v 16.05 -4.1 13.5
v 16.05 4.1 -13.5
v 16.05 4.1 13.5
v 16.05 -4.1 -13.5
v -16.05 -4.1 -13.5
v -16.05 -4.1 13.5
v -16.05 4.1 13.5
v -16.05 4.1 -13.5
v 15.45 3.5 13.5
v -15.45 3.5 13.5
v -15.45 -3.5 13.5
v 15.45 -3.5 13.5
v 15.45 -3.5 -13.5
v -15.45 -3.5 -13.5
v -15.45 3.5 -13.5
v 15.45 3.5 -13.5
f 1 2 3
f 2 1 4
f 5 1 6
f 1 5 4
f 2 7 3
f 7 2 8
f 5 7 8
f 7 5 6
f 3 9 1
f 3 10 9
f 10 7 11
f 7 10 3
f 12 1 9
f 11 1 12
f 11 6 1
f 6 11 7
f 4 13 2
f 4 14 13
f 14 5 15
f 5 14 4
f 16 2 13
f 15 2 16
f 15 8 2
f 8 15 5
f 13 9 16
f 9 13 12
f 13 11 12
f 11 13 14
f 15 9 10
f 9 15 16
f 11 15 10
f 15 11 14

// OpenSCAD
// file: basico.scad
////////////////////////////////////////////////////////////////////////////////////////////////////////////////////////
//
// utilidades y variables básicas que suelo usar
// It is licensed under the Creative Commons - GNU LGPL 2.1 license.
// © 2014-2017 by luiso gutierrez (sacamantecas)
//
// cada módulo tiene su ejemplo simple correspondiente
// se recomienda ver qué parámetros tiene y experimentar con ellos
//


// corte_a_capa(n, [por_exceso]) ajusta una altura a nº entero de capas (se espera que el llamador haya asignado valor a $alto_de_capa)
function corte_a_capa(cuanto, exceso=false) = floor((cuanto+(exceso?($alto_de_capa-.0001):0))/$alto_de_capa)*$alto_de_capa;
// correccion() sirve para remarcar el código donde se hace una corrección sobre un valor teórico para que la pieza salga perfecta en la práctica
function correccion( valor )=valor; 
// numero de facetas segun el diametro, ajustado a multiplo de 4 para casar figuras ortogonales
function fn(d) = floor(( d/$fs*3.1416+3)/4)*4 ; 



////////////////////////////////////////////////////////////////////////////////////////////////////////////////////////////////////////////////////////


mp = .1 ; // muy poco


// Para ayudar a la depuración dibujando un aspa (mejor resaltada con #) en el punto actual o con una traslación a partir del mismo
// ejemplo: marcar el punto y la orientación dentro de una transformación compleja:
//		translate([20, 0, 0]) rotate([0, 0, 60]) translate([0,30,0]) rotate([0,45,0]) translate([0,0,40]) aspa();
// es pueden dibujar planos en vez de ejes, por ejemplo el plano perpendicular a Y con el eje Y (los ejes X y Z no se pintan porque quedan incluidos en el plano): 
//		aspa([0,1,0]);
module aspa(normales=[0,0,0]) {
	mucho=200 ;
	if (normales[0]) cube([mp,mucho,mucho], center=true);
	if (normales[1]) cube([mucho,mp,mucho], center=true);
	if (normales[2]) cube([mucho,mucho,mp], center=true);
	if (!(normales[1]+normales[2])) cube([mucho,mp,mp], center=true);
	if (!(normales[0]+normales[2])) cube([mp,mucho,mp], center=true);
	if (!(normales[0]+normales[1])) cube([mp,mp,mucho], center=true);
}


////////////////////////////////////////////////////////////////////////////////////////////////////////////////////////////////////////////////////////
// afeitar una pieza: es un corte adelantado en la base, para ahorrarnos el afeitado posterior de la pieza
// dificilmente una transformación puede ser más lenta :(
// ejemplo:
//		afeita() cube([30, 20, 10]);
module afeita(cuanto=.25) {
	maximo=200 ;
	
	difference() {
		children();
		if (cuanto)
			minkowski() {
				difference() {
					translate([-maximo/2,-maximo/2,-mp])
						cube([maximo,maximo,$alto_de_capa+mp]);
					render()
						children();
				}
				translate([0,0,-mp])
					cylinder(r=cuanto, h=mp, $fn=4);
			}
	}
}

////////////////////////////////////////////////////////////////////////////////////////////////////////////////////////////////////////////////////////
// agujero para meter una rosca de embutir dándole un calentón con el soldador
// el soporte por defecto no se pone, y si se pone es para agujero horizontal por defecto
// ejemplo:	$fa=1;$fs=1;$alto_de_capa=.3; difference() { %cube([30, 20, 20]); translate([15, 0, 10]) rotate([-90,0,0]) rosca_embutir(soportada=1); translate([15, 10,20]) rotate([180,0,0]) rosca_embutir(8) ; translate([15, 0, 0]) rosca_embutir(soportada=1, soporte_axial=1); }
module rosca_embutir(profundidad=5, soportada=0, soporte_axial=0) {
	H = 4 ;	
	Dg = [5.6, 5.2];
	Dp = 3.4;
	ancho_churrito = .5;
	$fn=12;

	if ($alto_de_capa == undef) echo("$alto_de_capa SIN DEFINIR, ESTO NO PUEDE SALIR BIEN")	;
	
	difference() {
		union() {
			translate([0,0,(H-mp)/2]) cylinder(d1=Dg[0], d2=Dg[1], h=H+mp, center=true);
			translate([0,0,profundidad/2]) cylinder(d=Dp, h=profundidad, center=true);
		}
		if (soportada) {
			if (soporte_axial)
				translate([0, 0, -mp])				
					difference() {
						cylinder(d=Dp + 2 * ancho_churrito, h=H - $alto_de_capa + mp);
						translate([0, 0, -mp])
							cylinder(d = Dp, h=H - $alto_de_capa + 3*mp);
					}
			else {
				escala = (Dg[0] - 2 * $alto_de_capa) / Dg[0] ;
				angulo_voladizo = 50 ; // para estos tamaños se puede usar hasta 60º 
				translate([0,0,-1.5]) // un hueco horizontal de 1.5 está bien
					intersection() {
						scale([escala, escala, 1])
							rosca_embutir(profundidad=0, soportada=0);
						translate([0,0,profundidad/2])
							cube([Dg[0] * cos(angulo_voladizo), 6, profundidad], center=true);
					}
			}
		}
	}
}
// main file
//////////////////////////////////////////////////////////////////////////////////////////////////////////////
//
// frontal para la fuente de alimentación innobo i650
// It is licensed under the Creative Commons - GNU LGPL 2.1 license.
// © 2018 by luis gutierrez (sacamantecas)
//
//

use <basico.scad>

$fa = 5 ;
$fs = 1 ;
// constantes de uso interno;
X = 0 ;
Y = 1 ;
Z = 2 ;
mp = .1 ;
fabricar = true ;



bloque = [150, 27, 85];
fila_z = [20, 60];
columna_x = [20, 45, 70, 95];
interruptor_x = bloque[X] - columna_x[0];
interruptor_pasante_d = 6.8 ;
interruptor_pasante_e = 6 ;
interruptor_bloque = [12.2, bloque[Y],14];


bloque_USB = [32.1, bloque[Y], 8.2 ];
USB_x = interruptor_x + interruptor_pasante_d/2 - bloque_USB[X]/2;

LED1_x = interruptor_x ;
LED2_x = USB_x - (LED1_x - USB_x);
LED1_z = (fila_z[0]+fila_z[1])/2 - 3 ;
LED2_z = LED1_z;
LED_pasante_d = 8.4 ;
LED_pasante_e = 9 ;
LED_holgante_d = 18 ;


conector_pasante = 8.2 ;
conector_holgante = correccion(14 + .3) ;
conector_pasante_e = 3.5 ;

esparrago_d = correccion( 4 + .8 ) ;
esparrago_largo = bloque[Y] - 5 ;
esparrago_margen_x = 9 ;
esparrago_margen_z = esparrago_margen_x;

salida_cables_prot_dy = 3 ;
salida_cables_prot_d = 30 ;
salida_cables_d = 22 ;
salida_cables_dy = bloque[Y] - LED_pasante_e ;
salida_cables_x = bloque[X] - 14 ;
salida_cables_z = bloque[Z] / 2 ;

rebaje_trasero = bloque[Y] - 10 ;


// apaño para quitar holgura al bloque USB y facilitar el pegado
!rotate([90,0,0])
	difference() {
		cube(bloque_USB, center=true);		
		cube(bloque_USB - [1.2,-1,1.2], center=true);
	}


// patitas
for (x = [40, 60, 80, 100])
	translate([x, -30, 0])
		 difference() {
			diametro = 15 ;
			altura = 10 ;
			corte_desde_tornillo = 5 ; 
			cylinder(d=diametro, h=altura);
			cylinder(d=3.6, h=altura); // vastago tornillo
			translate([0,0,7])
				cylinder(d=6, h=altura); // cabeza tornillo
			translate([diametro/2 + corte_desde_tornillo, 0, altura/2])	
				cube([diametro, diametro, altura], center = true);
		}


// plantilla para hacer los agujeros a la fuente
rotate([(fabricar ? 90 : 0),0,0])
	 difference() {
		cube(bloque - [0, bloque[Y] - 1, 0]);
		translate([esparrago_margen_x+5, 0, esparrago_margen_z+5])
			cube(bloque - [(esparrago_margen_x+5)*2, bloque[Y] - 1, (esparrago_margen_z+5)*2]);
		for (lado = [-1, 1])
			for (altura = [-1, 1])
				translate([bloque[X]/2 + lado * (bloque[X]/2 - esparrago_margen_x), 0, bloque[Z]/2 + altura * (bloque[Z]/2 - esparrago_margen_z)])
					rotate([-90,0,0])
						cylinder(d=2, h=10);
	}


// frontal de la fuente
!
rotate([(fabricar ? 90 : 0),0,0])
	difference() {
		cube(bloque);
		// agujeros conectores arriba
		for (i=columna_x)
			translate([i, -mp, fila_z[1]]) {
				rotate([-90, 0, 0]) 
					cylinder(d=conector_pasante, h=bloque[Y]);
				translate([0, conector_pasante_e, 0])
					rotate([-90, 0, 0]) 
						cylinder(d=conector_holgante, h=bloque[Y]);
			}
		// interruptor
		translate([interruptor_x, 0, fila_z[1]]) {
			translate([0,interruptor_pasante_e + interruptor_bloque[Y]/2 ,0])
				cube(interruptor_bloque, center=true);
			translate([0,-mp,0])
				rotate([-90,0,0])
					cylinder(d=interruptor_pasante_d, h=bloque[Y]);
		}

		// fila de abajo
		for (i=[columna_x[0], columna_x[1], columna_x[2]] )
			translate([i, -mp, fila_z[0]]) {
				rotate([-90, 0, 0]) 
					cylinder(d=conector_pasante, h=bloque[Y]);
				translate([0, conector_pasante_e, 0])
					rotate([-90, 0, 0]) 
						cylinder(d=conector_holgante, h=bloque[Y]);
			}
		// conector USB
		translate([USB_x,-mp,fila_z[0]])
			bloque_USB();
		
		// LEDS
		translate([LED1_x, 0, LED1_z])
			LED();
		translate([LED2_x, 0, LED2_z])
			LED();

		// esparragos
		for (lado = [-1, 1])
			for (altura = [-1, 1])
				translate([bloque[X]/2 + lado * (bloque[X]/2 - esparrago_margen_x), 0, bloque[Z]/2 + altura * (bloque[Z]/2 - esparrago_margen_z)])
					esparrago();

		// rebajes
		difference() {
			translate([16, bloque[Y] - rebaje_trasero + mp, -mp])
				cube([118, bloque[Y], 75+mp]);
			translate([USB_x, 0, fila_z[0]])
				bloque_USB(envolvente=true);
		}

		// salida de cables
		difference() {
			translate([salida_cables_x, bloque[Y] - salida_cables_prot_dy, salida_cables_z])
				rotate([-90, 0, 0])		
					cylinder(d=salida_cables_prot_d, h = salida_cables_prot_dy + mp);
			// no quiero que asome el protector de cables por el lateral, así que dejo una parede de 1,5mm y ya veremos cómo se apaña
			translate([bloque[X] - 1.6, 0, 0])
				cube(bloque);
		}
		translate([salida_cables_x, bloque[Y] - salida_cables_dy, salida_cables_z])	
			rotate([-90, 0, 0])		
				cylinder(d = salida_cables_d, h=salida_cables_dy + mp);			

	}



////////////////////////////////////////////////////////////////////////////////////////////////////////////////////////////////////////////////////////////////////////////////////////////////////
////////////////////////////////////////////////////////////////////////////////////////////////////////////////////////////////////////////////////////////////////////////////////////////////////
////////////////////////////////////////////////////////////////////////////////////////////////////////////////////////////////////////////////////////////////////////////////////////////////////
////////////////////////////////////////////////////////////////////////////////////////////////////////////////////////////////////////////////////////////////////////////////////////////////////
////////////////////////////////////////////////////////////////////////////////////////////////////////////////////////////////////////////////////////////////////////////////////////////////////


module bloque_USB(envolvente=false) {
	grosor = 6 ;
	hueco_trasero_envolvente = 10 ;
	bloque_p = [15.5, 10, bloque_USB[Z]];
	
	if (envolvente) {
		translate([0, bloque_p[Y] + bloque_USB[Y]/2 - hueco_trasero_envolvente - bloque_p[Y], 0])
			cube(bloque_USB + [2*grosor, 0, 2*grosor], center=true);
	} else {
		for (lado = [-1, 1])
			translate([lado * 8.3, bloque_p[Y]/2, 0])
				cube(bloque_p+[0,mp,0], center=true);
		translate([0, bloque_p[Y] + bloque_USB[Y]/2, 0])
			cube(bloque_USB, center=true);
	}
}

module LED() {
	translate([0,-mp,0])
		rotate([-90,0,0])
			cylinder(d=LED_pasante_d, h=bloque[Y]);
	translate([0, LED_pasante_e, 0])
		rotate([-90,0,0])
			cylinder(d=LED_holgante_d, h=bloque[Y]);
}

module esparrago() {
	translate([0, bloque[Y] - esparrago_largo, 0])
		rotate([-90,0,0])
			cylinder(d=esparrago_d, h=esparrago_largo + mp);
}		
